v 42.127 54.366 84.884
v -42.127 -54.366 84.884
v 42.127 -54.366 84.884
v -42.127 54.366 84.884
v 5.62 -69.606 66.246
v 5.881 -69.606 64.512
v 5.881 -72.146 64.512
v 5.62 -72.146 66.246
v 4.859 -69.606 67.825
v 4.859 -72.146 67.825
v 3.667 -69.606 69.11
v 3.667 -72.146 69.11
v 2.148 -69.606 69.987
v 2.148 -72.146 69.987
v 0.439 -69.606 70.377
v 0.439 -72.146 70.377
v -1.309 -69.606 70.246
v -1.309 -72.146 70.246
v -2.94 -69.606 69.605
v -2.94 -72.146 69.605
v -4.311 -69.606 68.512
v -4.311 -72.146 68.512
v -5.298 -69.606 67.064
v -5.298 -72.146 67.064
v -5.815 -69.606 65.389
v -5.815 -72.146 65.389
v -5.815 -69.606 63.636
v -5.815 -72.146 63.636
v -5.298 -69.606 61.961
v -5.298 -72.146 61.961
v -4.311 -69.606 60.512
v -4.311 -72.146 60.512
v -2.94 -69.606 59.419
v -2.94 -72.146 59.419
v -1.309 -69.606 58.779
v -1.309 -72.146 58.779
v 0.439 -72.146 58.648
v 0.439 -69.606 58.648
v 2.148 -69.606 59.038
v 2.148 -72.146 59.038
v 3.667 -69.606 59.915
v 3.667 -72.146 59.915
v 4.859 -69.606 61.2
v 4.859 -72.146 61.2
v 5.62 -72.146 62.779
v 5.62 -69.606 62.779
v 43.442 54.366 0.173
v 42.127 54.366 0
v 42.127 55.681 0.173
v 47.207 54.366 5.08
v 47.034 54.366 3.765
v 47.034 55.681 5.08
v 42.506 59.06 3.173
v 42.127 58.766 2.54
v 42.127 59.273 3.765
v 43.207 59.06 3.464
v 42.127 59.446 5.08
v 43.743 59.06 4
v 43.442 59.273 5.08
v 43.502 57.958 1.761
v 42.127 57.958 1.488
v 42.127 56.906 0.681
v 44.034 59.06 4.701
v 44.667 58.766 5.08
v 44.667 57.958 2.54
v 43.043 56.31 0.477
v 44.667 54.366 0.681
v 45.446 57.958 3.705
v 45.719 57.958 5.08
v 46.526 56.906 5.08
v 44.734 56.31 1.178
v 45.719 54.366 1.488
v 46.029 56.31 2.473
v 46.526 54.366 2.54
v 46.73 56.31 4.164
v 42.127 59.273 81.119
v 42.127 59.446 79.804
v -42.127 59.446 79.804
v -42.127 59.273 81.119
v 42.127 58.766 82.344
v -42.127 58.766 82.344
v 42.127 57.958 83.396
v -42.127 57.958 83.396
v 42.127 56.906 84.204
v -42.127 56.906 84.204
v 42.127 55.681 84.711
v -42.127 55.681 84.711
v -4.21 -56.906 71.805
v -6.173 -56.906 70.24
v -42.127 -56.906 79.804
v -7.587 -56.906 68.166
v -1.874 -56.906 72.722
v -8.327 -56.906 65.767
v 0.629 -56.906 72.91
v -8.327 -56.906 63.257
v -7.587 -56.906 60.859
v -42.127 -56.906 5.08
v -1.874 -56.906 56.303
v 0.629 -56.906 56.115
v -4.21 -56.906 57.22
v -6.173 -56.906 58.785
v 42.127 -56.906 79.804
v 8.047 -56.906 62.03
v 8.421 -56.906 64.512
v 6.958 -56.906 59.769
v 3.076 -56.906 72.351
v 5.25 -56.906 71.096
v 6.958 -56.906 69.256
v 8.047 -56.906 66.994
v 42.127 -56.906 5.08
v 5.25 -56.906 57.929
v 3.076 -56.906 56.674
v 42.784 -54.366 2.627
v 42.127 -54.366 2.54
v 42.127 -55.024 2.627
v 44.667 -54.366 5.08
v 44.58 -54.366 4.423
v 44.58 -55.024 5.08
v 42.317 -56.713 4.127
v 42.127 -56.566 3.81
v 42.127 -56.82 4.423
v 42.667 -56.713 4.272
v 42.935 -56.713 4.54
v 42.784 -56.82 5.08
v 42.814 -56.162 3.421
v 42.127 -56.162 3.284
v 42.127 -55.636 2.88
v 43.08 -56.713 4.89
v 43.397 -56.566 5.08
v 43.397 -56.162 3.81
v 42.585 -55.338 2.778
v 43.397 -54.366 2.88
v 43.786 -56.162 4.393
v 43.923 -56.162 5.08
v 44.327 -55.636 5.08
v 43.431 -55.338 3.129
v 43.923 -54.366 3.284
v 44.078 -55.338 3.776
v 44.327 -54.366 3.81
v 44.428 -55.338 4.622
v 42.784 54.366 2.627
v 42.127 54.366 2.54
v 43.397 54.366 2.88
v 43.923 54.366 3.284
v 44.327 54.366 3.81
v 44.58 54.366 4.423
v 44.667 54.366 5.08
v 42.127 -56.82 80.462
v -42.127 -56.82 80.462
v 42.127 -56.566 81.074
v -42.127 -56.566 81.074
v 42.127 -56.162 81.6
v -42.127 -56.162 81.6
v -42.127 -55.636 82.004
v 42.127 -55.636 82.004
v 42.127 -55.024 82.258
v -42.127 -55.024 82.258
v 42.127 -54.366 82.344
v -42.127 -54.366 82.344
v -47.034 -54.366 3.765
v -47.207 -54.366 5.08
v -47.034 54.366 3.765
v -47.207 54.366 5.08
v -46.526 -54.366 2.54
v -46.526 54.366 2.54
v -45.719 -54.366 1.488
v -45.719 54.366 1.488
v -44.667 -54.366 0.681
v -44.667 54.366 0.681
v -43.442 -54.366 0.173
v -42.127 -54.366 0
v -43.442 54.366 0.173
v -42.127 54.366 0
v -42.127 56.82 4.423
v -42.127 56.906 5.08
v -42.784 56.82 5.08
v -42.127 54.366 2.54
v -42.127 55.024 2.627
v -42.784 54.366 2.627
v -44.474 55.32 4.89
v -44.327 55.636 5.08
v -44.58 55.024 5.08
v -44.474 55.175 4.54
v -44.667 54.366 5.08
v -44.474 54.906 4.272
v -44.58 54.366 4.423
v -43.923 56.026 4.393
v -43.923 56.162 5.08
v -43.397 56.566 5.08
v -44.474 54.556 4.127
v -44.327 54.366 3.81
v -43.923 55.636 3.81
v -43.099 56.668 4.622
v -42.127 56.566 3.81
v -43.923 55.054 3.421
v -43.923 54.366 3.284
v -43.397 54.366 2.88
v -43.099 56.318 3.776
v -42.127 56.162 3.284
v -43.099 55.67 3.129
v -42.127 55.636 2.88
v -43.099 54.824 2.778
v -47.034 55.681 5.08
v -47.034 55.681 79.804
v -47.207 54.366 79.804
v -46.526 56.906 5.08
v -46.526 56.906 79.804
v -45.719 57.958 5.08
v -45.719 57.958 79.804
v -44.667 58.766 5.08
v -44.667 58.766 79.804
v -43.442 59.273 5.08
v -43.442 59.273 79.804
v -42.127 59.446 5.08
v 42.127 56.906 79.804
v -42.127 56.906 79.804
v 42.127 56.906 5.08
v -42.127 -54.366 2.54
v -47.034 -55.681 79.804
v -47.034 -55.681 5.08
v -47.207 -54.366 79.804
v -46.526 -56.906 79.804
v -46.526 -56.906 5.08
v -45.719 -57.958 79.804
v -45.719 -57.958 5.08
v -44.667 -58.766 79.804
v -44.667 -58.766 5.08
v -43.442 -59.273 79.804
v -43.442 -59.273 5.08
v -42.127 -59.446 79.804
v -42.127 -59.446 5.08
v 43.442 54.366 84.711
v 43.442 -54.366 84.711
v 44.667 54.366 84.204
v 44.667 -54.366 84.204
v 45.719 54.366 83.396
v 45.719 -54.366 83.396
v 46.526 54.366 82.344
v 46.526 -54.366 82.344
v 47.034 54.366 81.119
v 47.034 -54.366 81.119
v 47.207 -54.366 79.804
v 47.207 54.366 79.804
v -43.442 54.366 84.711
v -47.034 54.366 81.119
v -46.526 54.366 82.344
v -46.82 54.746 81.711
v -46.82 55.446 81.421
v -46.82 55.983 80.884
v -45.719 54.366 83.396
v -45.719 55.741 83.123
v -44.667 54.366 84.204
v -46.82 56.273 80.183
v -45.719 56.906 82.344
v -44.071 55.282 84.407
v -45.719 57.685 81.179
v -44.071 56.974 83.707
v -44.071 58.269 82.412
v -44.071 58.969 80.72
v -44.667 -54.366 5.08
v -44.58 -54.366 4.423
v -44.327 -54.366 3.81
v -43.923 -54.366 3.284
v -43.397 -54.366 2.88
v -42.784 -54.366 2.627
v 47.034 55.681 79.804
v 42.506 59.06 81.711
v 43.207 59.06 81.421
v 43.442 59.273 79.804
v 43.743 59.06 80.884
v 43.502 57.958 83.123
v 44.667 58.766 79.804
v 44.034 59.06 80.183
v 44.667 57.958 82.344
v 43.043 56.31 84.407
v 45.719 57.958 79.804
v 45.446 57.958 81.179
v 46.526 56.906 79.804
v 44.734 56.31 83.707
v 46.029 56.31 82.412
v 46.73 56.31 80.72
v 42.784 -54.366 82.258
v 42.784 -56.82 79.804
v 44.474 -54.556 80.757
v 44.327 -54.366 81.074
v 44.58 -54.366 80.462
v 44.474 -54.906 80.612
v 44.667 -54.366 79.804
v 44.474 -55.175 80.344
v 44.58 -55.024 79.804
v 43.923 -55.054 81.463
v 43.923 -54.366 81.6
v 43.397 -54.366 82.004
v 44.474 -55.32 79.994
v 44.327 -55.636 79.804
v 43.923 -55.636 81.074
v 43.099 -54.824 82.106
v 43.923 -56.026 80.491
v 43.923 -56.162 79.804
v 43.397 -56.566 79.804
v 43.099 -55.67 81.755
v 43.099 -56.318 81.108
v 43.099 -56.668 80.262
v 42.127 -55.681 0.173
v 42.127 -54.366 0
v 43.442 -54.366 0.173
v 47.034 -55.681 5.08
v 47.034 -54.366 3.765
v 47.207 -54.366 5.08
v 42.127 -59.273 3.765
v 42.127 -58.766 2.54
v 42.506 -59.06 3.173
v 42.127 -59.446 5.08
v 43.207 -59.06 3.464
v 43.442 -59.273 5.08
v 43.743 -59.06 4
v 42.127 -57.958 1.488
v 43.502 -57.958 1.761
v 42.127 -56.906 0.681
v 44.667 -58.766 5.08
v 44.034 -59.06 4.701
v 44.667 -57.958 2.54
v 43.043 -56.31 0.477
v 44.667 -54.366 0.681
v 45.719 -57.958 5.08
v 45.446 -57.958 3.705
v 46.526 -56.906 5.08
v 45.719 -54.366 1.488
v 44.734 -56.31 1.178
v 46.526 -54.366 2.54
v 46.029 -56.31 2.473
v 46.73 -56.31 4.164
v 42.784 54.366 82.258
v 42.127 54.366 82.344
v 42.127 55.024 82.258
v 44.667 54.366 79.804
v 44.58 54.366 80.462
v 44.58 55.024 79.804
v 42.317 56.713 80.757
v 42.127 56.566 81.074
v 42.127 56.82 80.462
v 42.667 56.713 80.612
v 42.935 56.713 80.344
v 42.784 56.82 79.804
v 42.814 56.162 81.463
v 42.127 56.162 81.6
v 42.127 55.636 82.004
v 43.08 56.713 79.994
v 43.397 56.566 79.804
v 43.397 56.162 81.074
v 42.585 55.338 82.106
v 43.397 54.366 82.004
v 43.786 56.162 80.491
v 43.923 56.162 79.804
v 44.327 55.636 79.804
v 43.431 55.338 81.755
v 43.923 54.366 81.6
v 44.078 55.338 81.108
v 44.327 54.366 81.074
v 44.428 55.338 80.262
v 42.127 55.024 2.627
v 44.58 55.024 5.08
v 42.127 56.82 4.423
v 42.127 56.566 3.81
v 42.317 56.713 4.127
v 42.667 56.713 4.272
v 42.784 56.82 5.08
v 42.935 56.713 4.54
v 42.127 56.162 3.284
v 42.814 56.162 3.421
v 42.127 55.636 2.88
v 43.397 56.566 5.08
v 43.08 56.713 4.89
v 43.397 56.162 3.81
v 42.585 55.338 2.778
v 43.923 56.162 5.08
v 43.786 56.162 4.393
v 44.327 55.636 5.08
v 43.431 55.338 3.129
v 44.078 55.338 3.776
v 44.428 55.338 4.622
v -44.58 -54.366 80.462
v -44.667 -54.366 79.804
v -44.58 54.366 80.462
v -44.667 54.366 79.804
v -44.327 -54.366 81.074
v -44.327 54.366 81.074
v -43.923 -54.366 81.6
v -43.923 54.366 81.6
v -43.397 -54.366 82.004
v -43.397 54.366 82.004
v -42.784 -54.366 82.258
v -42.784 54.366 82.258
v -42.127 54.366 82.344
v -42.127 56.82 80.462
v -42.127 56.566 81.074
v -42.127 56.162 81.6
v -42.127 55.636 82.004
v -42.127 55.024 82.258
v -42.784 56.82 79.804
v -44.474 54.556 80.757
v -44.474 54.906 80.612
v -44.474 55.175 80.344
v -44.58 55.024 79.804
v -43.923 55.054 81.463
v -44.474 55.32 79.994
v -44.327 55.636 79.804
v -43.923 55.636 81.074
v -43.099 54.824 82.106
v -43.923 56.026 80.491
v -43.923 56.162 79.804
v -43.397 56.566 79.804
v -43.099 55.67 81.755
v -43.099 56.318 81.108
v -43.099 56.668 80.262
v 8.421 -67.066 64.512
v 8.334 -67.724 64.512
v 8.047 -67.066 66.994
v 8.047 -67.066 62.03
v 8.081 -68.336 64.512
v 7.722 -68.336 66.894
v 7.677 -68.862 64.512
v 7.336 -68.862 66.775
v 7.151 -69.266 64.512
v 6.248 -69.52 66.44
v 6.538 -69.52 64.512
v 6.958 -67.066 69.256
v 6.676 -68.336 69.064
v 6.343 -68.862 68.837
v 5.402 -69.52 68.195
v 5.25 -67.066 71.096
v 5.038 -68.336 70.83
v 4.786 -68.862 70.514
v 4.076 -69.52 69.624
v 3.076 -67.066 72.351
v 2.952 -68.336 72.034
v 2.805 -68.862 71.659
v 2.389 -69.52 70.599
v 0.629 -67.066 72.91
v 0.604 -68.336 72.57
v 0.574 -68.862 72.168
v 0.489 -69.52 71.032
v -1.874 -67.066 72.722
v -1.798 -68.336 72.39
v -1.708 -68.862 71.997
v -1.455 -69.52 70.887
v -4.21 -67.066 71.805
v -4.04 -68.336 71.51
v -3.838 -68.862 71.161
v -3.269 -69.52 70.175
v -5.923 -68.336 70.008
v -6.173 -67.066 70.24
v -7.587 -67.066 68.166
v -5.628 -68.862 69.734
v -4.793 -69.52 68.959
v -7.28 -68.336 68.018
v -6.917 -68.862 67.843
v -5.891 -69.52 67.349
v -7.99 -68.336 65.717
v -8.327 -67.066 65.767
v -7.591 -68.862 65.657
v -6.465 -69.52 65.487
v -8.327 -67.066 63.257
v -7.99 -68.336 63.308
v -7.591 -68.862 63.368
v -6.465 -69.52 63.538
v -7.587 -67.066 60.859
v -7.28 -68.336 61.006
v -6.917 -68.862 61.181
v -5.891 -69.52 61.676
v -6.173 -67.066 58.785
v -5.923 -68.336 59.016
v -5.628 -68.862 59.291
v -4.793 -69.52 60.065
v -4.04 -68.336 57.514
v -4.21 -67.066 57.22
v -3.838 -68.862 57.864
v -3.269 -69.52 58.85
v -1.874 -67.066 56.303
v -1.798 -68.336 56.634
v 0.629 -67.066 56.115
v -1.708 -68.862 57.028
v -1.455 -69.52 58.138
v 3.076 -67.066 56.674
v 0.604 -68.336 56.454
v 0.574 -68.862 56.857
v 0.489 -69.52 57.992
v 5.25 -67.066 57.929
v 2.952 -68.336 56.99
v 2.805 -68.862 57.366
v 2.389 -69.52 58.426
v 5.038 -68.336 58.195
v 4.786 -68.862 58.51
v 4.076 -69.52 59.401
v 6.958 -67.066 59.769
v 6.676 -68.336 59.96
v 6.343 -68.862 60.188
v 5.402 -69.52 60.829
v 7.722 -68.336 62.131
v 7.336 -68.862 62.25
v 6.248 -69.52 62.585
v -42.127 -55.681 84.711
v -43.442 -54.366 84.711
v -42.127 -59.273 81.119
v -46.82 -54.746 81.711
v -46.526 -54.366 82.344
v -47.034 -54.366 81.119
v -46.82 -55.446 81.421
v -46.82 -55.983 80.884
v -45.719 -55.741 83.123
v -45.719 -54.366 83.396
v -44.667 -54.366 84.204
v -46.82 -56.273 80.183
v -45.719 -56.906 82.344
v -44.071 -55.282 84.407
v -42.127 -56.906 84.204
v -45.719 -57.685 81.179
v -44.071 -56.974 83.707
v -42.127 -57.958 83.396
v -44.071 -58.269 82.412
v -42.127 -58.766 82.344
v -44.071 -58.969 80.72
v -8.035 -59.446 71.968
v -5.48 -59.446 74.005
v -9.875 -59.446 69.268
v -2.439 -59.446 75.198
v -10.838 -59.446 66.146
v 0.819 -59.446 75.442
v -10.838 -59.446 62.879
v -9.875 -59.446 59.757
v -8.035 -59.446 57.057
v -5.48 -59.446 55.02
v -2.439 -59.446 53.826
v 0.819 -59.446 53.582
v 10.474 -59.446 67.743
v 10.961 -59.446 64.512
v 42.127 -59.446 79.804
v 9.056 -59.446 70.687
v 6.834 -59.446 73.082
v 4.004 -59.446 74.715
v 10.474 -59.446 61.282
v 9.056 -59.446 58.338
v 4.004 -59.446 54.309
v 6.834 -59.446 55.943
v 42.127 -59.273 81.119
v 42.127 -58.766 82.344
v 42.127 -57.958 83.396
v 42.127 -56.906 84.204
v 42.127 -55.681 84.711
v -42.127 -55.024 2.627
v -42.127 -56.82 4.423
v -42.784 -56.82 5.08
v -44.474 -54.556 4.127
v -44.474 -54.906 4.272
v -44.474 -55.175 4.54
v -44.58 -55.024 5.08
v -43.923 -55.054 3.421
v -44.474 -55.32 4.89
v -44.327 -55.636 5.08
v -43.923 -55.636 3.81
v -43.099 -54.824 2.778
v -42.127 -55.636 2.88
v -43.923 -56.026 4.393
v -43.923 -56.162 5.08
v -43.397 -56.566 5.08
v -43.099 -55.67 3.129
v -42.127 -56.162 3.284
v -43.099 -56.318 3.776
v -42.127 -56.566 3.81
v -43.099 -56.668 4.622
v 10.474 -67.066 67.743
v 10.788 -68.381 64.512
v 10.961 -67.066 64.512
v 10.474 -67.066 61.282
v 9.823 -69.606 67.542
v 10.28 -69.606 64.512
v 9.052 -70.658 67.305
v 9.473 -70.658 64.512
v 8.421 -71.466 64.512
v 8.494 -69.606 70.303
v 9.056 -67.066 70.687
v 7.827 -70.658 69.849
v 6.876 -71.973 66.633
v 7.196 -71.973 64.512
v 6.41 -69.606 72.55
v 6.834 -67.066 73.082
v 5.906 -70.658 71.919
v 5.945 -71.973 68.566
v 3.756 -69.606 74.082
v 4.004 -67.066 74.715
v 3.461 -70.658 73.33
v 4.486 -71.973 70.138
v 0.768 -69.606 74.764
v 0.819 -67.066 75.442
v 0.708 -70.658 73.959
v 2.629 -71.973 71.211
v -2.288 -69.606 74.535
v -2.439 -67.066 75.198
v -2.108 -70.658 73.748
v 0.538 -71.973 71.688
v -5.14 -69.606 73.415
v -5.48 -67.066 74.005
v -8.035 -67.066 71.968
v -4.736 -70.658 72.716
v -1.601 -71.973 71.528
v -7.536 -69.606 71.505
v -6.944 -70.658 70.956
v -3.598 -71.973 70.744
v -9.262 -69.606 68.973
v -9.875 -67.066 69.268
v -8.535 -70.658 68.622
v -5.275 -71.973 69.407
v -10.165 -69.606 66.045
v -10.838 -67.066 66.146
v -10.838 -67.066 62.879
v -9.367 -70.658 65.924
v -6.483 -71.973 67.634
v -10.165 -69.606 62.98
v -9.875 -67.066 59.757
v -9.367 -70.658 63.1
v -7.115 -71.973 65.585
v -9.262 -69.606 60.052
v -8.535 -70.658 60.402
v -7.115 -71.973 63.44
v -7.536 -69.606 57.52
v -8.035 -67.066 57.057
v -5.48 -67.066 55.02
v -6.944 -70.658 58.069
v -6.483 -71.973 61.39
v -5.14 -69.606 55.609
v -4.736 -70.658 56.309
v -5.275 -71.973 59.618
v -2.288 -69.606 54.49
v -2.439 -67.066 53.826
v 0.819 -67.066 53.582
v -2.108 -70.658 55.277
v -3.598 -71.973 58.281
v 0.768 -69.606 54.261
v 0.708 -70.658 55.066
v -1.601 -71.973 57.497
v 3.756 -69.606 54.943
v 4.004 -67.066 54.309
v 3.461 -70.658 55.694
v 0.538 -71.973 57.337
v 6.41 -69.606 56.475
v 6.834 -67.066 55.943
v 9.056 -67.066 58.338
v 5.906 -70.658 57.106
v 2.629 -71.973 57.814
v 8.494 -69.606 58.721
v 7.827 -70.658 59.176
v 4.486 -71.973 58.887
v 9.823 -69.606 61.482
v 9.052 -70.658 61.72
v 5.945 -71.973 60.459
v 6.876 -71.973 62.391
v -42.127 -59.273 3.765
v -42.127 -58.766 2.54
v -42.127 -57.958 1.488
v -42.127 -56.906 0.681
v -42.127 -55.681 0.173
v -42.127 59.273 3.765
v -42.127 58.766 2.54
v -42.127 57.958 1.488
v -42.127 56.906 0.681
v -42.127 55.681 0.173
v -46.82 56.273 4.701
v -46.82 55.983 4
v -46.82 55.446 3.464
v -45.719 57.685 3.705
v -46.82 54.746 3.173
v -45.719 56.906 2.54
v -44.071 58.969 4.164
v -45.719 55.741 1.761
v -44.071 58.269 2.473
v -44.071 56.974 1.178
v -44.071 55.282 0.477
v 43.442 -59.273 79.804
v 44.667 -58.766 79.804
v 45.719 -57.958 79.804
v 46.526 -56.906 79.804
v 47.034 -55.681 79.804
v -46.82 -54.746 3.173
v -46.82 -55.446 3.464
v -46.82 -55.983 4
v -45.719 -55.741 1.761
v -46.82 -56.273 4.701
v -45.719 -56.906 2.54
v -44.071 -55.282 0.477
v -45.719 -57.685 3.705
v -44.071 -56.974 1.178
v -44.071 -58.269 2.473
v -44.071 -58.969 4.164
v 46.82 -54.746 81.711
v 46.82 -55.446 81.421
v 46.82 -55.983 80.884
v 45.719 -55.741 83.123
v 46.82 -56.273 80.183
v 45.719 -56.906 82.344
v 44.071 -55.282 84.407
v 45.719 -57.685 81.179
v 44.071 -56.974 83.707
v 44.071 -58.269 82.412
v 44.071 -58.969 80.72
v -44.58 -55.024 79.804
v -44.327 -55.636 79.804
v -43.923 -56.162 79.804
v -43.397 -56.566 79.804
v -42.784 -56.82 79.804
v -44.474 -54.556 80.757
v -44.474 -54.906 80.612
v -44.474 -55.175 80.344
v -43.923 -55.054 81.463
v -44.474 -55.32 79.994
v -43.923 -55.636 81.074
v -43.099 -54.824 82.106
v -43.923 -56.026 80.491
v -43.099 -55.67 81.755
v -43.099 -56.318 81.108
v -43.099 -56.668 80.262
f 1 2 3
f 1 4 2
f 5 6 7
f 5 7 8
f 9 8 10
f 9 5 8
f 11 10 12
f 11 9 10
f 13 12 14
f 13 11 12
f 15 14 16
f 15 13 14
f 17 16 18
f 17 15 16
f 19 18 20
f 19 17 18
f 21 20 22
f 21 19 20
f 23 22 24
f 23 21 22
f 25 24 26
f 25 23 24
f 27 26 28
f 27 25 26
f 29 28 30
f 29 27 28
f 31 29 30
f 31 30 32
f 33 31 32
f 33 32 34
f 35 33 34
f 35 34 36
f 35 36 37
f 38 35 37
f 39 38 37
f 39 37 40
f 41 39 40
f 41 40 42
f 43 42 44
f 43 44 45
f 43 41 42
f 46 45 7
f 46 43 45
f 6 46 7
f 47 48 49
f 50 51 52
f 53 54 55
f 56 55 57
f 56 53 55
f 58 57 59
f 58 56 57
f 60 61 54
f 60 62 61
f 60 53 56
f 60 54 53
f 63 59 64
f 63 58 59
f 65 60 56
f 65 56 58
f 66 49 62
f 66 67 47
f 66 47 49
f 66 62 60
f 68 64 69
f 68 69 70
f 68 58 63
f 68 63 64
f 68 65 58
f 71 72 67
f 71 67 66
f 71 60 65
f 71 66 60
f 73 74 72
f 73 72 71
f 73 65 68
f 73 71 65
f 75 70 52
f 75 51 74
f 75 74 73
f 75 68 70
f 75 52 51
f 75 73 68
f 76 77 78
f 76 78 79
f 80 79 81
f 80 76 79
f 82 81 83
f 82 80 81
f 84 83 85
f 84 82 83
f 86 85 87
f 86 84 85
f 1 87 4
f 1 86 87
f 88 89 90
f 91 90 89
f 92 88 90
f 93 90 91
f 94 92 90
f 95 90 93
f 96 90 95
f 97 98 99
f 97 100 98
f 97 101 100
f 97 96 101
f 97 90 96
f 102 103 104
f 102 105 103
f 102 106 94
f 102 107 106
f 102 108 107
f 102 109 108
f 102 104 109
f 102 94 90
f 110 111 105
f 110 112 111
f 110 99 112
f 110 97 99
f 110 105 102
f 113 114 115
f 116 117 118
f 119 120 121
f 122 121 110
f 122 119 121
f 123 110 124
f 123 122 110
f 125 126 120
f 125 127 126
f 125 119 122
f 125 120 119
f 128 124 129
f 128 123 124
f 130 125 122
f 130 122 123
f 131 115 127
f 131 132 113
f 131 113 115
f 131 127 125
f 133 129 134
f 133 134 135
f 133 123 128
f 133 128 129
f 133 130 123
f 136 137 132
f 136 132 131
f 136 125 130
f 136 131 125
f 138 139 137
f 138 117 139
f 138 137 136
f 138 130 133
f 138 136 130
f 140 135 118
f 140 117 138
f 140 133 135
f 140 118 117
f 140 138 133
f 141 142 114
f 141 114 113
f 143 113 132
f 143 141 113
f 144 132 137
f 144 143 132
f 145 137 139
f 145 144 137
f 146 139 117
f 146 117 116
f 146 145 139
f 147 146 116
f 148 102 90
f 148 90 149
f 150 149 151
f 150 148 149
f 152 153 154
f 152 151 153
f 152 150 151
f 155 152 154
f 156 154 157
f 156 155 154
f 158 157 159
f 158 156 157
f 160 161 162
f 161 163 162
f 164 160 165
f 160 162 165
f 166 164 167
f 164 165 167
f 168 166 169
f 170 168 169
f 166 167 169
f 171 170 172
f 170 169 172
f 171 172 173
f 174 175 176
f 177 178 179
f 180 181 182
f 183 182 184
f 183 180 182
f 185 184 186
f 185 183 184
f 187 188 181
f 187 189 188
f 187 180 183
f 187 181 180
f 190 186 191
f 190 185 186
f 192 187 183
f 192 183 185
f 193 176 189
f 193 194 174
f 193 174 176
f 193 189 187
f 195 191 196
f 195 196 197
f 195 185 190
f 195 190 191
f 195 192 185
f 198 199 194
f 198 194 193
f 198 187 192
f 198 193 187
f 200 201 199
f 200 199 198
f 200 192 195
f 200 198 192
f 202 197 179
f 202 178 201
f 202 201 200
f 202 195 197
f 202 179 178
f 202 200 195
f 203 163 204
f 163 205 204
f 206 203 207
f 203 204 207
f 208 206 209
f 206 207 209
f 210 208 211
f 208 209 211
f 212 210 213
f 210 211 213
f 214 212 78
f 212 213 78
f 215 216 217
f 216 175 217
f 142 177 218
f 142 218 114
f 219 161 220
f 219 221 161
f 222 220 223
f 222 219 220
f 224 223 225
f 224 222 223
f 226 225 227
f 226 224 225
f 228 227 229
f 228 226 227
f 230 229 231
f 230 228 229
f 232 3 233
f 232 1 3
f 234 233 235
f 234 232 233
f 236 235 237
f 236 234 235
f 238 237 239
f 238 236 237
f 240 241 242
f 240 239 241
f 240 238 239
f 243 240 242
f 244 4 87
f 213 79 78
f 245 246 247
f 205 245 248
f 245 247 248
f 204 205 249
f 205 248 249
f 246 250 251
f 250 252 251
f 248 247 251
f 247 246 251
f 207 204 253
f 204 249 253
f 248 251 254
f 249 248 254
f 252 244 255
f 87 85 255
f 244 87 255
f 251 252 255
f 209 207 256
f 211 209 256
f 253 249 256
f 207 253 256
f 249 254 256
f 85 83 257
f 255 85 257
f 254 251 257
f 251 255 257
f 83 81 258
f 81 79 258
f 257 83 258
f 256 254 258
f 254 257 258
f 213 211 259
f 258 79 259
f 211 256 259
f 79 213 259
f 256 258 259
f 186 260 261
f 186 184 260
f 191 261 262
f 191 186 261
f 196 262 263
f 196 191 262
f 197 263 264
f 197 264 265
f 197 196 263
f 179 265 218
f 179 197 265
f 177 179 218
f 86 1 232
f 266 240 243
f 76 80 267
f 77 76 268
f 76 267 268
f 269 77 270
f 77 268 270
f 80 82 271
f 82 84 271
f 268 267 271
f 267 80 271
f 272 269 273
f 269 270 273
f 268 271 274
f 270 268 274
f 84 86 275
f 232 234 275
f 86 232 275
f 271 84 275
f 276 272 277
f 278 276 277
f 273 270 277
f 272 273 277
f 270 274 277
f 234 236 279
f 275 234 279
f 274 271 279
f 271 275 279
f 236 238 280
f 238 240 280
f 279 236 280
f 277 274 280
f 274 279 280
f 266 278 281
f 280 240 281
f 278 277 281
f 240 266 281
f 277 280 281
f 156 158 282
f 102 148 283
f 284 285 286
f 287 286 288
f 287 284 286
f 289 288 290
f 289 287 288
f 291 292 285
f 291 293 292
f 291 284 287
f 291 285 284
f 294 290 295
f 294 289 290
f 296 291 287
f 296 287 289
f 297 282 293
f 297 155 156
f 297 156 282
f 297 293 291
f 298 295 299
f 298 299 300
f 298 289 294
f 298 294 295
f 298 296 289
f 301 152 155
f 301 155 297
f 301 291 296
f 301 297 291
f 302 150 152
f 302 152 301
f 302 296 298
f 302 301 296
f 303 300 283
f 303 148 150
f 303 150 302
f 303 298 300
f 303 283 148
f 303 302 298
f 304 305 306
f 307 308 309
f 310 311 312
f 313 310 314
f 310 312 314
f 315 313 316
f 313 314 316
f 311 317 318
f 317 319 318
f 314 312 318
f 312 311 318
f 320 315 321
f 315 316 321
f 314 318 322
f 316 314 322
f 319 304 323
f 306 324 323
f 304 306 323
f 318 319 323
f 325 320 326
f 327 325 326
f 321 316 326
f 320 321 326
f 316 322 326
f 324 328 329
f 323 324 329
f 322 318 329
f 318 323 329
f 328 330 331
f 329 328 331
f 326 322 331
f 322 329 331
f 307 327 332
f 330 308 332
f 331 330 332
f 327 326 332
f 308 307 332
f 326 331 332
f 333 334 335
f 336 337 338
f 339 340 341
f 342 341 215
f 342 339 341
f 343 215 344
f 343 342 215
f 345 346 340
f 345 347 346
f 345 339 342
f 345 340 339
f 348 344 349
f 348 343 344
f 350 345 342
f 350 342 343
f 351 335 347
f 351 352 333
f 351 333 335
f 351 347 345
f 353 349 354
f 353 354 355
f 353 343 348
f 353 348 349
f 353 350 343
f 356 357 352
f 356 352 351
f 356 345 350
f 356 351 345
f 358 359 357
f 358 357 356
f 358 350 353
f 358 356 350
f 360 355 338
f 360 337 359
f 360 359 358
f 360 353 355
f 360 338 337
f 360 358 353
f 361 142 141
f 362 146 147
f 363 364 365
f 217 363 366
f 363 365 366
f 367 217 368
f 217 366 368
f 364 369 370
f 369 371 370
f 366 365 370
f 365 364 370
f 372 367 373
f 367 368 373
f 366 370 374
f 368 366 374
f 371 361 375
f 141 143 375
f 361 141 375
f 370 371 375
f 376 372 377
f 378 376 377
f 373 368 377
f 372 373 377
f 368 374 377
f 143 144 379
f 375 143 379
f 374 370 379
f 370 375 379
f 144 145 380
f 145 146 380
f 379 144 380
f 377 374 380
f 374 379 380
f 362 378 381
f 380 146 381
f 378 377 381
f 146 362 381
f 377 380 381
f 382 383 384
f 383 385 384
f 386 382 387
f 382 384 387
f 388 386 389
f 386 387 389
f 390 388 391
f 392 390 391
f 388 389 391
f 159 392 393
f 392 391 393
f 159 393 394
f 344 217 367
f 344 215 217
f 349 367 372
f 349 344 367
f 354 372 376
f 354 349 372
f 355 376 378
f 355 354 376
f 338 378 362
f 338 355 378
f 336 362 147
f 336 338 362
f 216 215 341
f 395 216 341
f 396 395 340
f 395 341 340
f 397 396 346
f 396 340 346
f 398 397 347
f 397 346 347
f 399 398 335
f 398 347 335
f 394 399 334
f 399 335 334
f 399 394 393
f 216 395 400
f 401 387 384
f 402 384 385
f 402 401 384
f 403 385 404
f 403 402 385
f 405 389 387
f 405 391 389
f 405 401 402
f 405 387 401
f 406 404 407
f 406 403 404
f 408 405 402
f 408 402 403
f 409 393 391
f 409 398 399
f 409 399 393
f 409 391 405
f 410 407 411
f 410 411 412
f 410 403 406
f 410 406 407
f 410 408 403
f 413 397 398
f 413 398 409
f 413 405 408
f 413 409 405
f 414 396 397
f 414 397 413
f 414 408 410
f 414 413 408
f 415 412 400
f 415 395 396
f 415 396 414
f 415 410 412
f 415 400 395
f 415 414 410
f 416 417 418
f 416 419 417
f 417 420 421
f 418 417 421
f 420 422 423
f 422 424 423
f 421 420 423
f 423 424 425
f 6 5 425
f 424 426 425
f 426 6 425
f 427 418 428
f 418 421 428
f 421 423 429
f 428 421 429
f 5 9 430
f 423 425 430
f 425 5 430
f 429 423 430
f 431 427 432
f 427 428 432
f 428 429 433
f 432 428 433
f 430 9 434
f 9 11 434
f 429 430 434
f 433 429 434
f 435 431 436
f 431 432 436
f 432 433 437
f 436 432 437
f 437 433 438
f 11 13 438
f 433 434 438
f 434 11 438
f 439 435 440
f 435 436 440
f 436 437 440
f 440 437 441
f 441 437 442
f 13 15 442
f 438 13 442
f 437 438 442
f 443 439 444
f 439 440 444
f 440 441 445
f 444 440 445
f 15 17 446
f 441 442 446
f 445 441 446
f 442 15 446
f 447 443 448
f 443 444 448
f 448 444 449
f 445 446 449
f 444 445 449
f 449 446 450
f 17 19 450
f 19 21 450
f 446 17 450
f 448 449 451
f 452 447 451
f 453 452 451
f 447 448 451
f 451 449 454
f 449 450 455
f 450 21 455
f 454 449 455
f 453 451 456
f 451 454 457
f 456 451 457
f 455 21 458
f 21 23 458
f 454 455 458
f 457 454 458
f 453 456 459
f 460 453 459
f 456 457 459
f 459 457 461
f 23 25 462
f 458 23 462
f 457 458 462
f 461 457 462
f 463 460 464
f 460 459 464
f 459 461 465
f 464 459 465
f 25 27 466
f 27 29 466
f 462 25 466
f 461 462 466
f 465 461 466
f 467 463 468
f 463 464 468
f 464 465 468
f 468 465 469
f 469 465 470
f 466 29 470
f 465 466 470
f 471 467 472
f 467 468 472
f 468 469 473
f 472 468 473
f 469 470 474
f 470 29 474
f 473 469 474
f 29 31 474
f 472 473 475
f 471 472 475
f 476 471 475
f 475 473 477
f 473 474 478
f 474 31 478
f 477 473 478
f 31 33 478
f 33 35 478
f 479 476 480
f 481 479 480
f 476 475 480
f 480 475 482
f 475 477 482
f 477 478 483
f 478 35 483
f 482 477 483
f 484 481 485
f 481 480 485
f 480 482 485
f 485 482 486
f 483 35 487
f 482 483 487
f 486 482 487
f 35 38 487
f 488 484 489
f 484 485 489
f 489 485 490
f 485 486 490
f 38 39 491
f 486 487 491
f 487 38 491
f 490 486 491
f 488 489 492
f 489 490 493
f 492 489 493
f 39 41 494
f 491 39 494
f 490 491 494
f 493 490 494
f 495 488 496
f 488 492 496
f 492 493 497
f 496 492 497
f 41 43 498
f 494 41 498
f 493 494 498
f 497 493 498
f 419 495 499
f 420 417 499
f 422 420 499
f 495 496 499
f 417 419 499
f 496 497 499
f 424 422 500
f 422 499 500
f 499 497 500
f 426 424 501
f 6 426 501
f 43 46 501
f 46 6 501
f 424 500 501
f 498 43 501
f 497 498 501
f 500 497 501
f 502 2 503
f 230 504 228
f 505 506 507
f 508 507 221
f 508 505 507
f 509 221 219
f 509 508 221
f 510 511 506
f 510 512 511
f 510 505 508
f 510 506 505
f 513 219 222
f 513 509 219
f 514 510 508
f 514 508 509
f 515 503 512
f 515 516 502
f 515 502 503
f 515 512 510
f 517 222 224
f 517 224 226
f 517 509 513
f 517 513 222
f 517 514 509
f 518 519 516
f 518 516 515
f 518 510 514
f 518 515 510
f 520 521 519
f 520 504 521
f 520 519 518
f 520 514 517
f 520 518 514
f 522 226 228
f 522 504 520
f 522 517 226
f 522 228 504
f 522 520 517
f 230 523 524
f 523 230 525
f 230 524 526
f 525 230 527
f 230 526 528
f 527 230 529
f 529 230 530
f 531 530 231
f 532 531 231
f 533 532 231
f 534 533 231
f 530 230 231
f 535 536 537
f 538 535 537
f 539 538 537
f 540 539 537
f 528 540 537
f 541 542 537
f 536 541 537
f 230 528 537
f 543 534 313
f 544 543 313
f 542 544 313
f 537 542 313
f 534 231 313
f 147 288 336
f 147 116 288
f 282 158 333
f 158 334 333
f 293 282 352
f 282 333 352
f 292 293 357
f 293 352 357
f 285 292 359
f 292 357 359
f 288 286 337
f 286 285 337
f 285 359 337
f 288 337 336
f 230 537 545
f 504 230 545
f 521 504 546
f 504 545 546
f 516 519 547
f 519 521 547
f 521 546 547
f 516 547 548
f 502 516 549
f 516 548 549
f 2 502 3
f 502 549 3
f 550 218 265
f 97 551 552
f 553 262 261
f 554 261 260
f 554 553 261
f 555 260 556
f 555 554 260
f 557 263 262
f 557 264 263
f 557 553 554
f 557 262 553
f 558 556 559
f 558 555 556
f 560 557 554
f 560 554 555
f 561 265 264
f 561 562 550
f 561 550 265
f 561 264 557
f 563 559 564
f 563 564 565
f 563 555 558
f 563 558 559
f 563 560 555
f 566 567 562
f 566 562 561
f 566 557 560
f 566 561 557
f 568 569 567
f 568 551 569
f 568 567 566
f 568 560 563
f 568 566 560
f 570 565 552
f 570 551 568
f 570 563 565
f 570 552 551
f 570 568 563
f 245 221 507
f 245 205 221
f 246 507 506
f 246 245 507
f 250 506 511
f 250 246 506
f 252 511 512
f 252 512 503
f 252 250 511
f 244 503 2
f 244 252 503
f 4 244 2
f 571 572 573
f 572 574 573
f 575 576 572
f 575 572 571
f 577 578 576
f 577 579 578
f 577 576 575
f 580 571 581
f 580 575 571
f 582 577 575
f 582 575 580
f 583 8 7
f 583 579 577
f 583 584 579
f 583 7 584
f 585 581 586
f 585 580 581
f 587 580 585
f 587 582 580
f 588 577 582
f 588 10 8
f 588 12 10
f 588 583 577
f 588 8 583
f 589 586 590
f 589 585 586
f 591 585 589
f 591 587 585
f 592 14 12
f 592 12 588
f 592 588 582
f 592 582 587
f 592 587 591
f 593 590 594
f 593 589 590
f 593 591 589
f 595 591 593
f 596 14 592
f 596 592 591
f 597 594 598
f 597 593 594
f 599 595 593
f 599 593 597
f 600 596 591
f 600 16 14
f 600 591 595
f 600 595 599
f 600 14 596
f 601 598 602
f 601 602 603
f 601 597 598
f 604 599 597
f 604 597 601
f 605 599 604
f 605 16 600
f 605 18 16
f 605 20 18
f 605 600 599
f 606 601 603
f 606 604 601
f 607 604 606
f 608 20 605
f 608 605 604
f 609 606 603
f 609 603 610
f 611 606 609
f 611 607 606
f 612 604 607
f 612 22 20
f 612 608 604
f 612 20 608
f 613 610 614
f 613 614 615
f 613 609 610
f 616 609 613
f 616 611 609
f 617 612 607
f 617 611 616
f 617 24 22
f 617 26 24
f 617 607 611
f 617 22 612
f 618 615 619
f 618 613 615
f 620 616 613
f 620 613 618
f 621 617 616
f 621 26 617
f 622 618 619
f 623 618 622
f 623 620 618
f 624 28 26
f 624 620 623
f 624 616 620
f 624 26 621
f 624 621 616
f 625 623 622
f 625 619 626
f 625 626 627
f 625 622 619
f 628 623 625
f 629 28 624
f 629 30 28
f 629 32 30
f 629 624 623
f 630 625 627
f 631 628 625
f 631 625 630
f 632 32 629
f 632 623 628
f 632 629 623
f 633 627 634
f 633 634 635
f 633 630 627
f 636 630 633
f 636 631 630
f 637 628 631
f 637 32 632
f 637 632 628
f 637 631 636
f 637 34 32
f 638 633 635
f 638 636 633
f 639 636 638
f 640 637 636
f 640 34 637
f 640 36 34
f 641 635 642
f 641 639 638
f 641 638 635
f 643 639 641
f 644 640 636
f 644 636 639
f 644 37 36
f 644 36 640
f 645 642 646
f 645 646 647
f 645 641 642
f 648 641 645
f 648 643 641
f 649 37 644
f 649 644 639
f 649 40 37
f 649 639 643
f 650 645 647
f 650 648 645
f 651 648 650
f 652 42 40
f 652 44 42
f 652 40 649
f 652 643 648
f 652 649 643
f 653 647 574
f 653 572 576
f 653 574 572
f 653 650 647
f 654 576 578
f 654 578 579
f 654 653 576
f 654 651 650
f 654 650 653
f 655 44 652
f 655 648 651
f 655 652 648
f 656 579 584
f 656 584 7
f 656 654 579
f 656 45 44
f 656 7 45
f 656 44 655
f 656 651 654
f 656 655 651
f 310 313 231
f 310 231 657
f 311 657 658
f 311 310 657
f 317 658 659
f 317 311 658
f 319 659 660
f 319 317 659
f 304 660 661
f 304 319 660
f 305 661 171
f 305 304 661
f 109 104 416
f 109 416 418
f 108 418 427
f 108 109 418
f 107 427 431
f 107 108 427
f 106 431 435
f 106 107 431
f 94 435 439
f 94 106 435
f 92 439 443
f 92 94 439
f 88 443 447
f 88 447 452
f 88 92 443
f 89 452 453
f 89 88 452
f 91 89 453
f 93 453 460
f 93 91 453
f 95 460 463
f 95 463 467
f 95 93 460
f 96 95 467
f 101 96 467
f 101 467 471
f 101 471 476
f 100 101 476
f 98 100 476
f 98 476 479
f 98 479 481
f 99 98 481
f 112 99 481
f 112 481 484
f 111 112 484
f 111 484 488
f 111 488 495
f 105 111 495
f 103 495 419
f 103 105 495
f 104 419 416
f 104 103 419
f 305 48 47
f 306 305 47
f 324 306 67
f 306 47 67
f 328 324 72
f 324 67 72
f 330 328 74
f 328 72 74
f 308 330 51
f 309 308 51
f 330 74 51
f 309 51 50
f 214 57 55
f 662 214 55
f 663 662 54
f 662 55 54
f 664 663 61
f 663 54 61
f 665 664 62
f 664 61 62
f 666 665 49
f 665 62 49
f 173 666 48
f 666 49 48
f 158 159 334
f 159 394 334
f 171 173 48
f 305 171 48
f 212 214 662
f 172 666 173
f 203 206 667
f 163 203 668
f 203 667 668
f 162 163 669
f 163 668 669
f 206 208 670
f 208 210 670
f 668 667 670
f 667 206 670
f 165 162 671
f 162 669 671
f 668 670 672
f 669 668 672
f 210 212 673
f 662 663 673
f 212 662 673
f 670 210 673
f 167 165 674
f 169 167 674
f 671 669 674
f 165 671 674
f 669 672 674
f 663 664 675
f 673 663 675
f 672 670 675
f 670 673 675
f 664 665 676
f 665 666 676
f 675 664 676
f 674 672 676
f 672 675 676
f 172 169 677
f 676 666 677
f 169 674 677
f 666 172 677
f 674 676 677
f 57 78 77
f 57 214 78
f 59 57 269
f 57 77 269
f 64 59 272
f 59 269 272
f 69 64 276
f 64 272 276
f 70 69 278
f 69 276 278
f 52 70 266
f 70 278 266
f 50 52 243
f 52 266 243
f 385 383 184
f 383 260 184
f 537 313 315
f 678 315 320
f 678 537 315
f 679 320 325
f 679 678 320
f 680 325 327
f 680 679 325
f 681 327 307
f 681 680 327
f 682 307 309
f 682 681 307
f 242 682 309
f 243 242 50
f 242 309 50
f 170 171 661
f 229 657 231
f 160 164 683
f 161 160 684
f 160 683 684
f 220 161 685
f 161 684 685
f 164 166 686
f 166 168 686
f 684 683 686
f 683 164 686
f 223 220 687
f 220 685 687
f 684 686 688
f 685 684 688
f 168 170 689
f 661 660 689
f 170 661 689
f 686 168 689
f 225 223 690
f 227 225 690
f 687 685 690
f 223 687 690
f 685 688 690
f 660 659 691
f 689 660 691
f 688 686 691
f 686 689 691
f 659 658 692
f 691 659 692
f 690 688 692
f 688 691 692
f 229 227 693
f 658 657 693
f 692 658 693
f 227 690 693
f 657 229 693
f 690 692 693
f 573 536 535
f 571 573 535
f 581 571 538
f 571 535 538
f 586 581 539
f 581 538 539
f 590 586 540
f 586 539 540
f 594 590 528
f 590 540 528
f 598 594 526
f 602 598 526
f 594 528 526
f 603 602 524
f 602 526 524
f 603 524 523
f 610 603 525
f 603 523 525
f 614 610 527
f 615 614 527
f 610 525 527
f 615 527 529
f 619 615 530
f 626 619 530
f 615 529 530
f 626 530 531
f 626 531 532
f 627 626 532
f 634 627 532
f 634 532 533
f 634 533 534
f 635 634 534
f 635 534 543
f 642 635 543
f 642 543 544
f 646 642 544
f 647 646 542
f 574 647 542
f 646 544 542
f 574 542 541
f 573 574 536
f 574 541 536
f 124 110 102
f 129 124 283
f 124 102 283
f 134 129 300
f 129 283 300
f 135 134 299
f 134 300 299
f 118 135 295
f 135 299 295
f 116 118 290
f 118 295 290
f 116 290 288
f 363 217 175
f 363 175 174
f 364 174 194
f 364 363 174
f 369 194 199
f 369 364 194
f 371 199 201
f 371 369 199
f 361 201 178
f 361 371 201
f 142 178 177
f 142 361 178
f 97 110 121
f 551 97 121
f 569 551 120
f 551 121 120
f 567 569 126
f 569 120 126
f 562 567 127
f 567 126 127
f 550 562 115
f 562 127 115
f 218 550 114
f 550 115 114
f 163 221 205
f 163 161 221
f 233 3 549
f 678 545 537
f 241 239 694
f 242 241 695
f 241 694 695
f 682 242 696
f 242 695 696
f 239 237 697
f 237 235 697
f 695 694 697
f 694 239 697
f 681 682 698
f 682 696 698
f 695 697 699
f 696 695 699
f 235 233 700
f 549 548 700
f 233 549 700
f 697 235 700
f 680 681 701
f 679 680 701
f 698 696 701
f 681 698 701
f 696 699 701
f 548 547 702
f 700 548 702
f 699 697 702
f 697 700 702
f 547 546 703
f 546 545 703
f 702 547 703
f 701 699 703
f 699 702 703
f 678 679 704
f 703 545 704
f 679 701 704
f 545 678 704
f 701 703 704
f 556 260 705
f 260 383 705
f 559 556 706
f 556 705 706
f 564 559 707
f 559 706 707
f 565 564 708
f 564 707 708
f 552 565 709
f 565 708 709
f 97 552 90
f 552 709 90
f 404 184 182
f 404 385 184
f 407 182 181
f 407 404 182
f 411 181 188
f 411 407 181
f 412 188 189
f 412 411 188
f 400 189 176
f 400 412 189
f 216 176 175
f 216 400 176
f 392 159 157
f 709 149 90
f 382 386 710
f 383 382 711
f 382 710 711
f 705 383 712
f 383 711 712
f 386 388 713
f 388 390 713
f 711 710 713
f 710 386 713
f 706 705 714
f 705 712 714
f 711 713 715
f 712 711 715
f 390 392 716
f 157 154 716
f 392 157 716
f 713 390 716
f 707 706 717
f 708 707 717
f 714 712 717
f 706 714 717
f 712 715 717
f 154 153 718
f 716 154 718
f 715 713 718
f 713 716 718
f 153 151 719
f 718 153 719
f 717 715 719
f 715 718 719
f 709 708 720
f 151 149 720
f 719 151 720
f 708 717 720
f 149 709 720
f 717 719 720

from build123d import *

# Parameters (mm, degrees)
F0_W     = 94.4138541818
F0_H     = 118.8927069306
F1_DEPTH = 84.88416
F2_R     = 10.9607963201
F3_DEPTH = 12.7
F4_R     = 5.08
F5_T     = -2.54


# Not quite as in the source:
# - a shell that OpenCascade refuses in one call is made with other operations: the cavity is built on its own and cut out


with BuildPart() as f1:
    # F0 (on Top) → F1 (new body)
    with BuildSketch(Plane.XY):
        Rectangle(F0_W, F0_H)
    extrude(amount=F1_DEPTH)

    # F2 (on face) → F3 (join)
    with BuildSketch(Plane.XZ.offset(59.4463534653)):
        with Locations((0, 64.512334764)):
            Circle(F2_R)
    extrude(amount=F3_DEPTH)

    # F4
    f4_edges = [f1.edges().sort_by_distance(p)[0] for p in [
        (0, -59.446353, 84.88416),
        (47.206927, 0, 84.88416),
        (47.206927, 0, 0),
        (0, -59.446353, 0),
        (0, 59.446353, 84.88416),
        (-47.206927, 0, 84.88416),
        (0, 59.446353, 0),
        (47.206927, 59.446353, 42.44208),
        (47.206927, -59.446353, 42.44208),
        (-47.206927, 59.446353, 42.44208),
        (-47.206927, 0, 0),
        (-47.206927, -59.446353, 42.44208),
        (-10.960796, -72.146353, 64.512335),
    ]]
    fillet(f4_edges, radius=F4_R)

    # F5: a shell. OpenCascade refuses it in one call, so the cavity is built on its own and cut out:
    # the body offset inwards by the wall thickness, plus a prism from it out through each open face.
    f5_core = offset(f1.part, amount=F5_T, kind=Kind.INTERSECTION, mode=Mode.PRIVATE)
    f5_exits = [f5_core.faces().sort_by_distance(p)[0] for p in [
        (0, -69.606353, 64.512335),
    ]]
    add(f5_core, mode=Mode.SUBTRACT)
    extrude(f5_exits, amount=-F5_T, mode=Mode.SUBTRACT)


solid = f1.part
